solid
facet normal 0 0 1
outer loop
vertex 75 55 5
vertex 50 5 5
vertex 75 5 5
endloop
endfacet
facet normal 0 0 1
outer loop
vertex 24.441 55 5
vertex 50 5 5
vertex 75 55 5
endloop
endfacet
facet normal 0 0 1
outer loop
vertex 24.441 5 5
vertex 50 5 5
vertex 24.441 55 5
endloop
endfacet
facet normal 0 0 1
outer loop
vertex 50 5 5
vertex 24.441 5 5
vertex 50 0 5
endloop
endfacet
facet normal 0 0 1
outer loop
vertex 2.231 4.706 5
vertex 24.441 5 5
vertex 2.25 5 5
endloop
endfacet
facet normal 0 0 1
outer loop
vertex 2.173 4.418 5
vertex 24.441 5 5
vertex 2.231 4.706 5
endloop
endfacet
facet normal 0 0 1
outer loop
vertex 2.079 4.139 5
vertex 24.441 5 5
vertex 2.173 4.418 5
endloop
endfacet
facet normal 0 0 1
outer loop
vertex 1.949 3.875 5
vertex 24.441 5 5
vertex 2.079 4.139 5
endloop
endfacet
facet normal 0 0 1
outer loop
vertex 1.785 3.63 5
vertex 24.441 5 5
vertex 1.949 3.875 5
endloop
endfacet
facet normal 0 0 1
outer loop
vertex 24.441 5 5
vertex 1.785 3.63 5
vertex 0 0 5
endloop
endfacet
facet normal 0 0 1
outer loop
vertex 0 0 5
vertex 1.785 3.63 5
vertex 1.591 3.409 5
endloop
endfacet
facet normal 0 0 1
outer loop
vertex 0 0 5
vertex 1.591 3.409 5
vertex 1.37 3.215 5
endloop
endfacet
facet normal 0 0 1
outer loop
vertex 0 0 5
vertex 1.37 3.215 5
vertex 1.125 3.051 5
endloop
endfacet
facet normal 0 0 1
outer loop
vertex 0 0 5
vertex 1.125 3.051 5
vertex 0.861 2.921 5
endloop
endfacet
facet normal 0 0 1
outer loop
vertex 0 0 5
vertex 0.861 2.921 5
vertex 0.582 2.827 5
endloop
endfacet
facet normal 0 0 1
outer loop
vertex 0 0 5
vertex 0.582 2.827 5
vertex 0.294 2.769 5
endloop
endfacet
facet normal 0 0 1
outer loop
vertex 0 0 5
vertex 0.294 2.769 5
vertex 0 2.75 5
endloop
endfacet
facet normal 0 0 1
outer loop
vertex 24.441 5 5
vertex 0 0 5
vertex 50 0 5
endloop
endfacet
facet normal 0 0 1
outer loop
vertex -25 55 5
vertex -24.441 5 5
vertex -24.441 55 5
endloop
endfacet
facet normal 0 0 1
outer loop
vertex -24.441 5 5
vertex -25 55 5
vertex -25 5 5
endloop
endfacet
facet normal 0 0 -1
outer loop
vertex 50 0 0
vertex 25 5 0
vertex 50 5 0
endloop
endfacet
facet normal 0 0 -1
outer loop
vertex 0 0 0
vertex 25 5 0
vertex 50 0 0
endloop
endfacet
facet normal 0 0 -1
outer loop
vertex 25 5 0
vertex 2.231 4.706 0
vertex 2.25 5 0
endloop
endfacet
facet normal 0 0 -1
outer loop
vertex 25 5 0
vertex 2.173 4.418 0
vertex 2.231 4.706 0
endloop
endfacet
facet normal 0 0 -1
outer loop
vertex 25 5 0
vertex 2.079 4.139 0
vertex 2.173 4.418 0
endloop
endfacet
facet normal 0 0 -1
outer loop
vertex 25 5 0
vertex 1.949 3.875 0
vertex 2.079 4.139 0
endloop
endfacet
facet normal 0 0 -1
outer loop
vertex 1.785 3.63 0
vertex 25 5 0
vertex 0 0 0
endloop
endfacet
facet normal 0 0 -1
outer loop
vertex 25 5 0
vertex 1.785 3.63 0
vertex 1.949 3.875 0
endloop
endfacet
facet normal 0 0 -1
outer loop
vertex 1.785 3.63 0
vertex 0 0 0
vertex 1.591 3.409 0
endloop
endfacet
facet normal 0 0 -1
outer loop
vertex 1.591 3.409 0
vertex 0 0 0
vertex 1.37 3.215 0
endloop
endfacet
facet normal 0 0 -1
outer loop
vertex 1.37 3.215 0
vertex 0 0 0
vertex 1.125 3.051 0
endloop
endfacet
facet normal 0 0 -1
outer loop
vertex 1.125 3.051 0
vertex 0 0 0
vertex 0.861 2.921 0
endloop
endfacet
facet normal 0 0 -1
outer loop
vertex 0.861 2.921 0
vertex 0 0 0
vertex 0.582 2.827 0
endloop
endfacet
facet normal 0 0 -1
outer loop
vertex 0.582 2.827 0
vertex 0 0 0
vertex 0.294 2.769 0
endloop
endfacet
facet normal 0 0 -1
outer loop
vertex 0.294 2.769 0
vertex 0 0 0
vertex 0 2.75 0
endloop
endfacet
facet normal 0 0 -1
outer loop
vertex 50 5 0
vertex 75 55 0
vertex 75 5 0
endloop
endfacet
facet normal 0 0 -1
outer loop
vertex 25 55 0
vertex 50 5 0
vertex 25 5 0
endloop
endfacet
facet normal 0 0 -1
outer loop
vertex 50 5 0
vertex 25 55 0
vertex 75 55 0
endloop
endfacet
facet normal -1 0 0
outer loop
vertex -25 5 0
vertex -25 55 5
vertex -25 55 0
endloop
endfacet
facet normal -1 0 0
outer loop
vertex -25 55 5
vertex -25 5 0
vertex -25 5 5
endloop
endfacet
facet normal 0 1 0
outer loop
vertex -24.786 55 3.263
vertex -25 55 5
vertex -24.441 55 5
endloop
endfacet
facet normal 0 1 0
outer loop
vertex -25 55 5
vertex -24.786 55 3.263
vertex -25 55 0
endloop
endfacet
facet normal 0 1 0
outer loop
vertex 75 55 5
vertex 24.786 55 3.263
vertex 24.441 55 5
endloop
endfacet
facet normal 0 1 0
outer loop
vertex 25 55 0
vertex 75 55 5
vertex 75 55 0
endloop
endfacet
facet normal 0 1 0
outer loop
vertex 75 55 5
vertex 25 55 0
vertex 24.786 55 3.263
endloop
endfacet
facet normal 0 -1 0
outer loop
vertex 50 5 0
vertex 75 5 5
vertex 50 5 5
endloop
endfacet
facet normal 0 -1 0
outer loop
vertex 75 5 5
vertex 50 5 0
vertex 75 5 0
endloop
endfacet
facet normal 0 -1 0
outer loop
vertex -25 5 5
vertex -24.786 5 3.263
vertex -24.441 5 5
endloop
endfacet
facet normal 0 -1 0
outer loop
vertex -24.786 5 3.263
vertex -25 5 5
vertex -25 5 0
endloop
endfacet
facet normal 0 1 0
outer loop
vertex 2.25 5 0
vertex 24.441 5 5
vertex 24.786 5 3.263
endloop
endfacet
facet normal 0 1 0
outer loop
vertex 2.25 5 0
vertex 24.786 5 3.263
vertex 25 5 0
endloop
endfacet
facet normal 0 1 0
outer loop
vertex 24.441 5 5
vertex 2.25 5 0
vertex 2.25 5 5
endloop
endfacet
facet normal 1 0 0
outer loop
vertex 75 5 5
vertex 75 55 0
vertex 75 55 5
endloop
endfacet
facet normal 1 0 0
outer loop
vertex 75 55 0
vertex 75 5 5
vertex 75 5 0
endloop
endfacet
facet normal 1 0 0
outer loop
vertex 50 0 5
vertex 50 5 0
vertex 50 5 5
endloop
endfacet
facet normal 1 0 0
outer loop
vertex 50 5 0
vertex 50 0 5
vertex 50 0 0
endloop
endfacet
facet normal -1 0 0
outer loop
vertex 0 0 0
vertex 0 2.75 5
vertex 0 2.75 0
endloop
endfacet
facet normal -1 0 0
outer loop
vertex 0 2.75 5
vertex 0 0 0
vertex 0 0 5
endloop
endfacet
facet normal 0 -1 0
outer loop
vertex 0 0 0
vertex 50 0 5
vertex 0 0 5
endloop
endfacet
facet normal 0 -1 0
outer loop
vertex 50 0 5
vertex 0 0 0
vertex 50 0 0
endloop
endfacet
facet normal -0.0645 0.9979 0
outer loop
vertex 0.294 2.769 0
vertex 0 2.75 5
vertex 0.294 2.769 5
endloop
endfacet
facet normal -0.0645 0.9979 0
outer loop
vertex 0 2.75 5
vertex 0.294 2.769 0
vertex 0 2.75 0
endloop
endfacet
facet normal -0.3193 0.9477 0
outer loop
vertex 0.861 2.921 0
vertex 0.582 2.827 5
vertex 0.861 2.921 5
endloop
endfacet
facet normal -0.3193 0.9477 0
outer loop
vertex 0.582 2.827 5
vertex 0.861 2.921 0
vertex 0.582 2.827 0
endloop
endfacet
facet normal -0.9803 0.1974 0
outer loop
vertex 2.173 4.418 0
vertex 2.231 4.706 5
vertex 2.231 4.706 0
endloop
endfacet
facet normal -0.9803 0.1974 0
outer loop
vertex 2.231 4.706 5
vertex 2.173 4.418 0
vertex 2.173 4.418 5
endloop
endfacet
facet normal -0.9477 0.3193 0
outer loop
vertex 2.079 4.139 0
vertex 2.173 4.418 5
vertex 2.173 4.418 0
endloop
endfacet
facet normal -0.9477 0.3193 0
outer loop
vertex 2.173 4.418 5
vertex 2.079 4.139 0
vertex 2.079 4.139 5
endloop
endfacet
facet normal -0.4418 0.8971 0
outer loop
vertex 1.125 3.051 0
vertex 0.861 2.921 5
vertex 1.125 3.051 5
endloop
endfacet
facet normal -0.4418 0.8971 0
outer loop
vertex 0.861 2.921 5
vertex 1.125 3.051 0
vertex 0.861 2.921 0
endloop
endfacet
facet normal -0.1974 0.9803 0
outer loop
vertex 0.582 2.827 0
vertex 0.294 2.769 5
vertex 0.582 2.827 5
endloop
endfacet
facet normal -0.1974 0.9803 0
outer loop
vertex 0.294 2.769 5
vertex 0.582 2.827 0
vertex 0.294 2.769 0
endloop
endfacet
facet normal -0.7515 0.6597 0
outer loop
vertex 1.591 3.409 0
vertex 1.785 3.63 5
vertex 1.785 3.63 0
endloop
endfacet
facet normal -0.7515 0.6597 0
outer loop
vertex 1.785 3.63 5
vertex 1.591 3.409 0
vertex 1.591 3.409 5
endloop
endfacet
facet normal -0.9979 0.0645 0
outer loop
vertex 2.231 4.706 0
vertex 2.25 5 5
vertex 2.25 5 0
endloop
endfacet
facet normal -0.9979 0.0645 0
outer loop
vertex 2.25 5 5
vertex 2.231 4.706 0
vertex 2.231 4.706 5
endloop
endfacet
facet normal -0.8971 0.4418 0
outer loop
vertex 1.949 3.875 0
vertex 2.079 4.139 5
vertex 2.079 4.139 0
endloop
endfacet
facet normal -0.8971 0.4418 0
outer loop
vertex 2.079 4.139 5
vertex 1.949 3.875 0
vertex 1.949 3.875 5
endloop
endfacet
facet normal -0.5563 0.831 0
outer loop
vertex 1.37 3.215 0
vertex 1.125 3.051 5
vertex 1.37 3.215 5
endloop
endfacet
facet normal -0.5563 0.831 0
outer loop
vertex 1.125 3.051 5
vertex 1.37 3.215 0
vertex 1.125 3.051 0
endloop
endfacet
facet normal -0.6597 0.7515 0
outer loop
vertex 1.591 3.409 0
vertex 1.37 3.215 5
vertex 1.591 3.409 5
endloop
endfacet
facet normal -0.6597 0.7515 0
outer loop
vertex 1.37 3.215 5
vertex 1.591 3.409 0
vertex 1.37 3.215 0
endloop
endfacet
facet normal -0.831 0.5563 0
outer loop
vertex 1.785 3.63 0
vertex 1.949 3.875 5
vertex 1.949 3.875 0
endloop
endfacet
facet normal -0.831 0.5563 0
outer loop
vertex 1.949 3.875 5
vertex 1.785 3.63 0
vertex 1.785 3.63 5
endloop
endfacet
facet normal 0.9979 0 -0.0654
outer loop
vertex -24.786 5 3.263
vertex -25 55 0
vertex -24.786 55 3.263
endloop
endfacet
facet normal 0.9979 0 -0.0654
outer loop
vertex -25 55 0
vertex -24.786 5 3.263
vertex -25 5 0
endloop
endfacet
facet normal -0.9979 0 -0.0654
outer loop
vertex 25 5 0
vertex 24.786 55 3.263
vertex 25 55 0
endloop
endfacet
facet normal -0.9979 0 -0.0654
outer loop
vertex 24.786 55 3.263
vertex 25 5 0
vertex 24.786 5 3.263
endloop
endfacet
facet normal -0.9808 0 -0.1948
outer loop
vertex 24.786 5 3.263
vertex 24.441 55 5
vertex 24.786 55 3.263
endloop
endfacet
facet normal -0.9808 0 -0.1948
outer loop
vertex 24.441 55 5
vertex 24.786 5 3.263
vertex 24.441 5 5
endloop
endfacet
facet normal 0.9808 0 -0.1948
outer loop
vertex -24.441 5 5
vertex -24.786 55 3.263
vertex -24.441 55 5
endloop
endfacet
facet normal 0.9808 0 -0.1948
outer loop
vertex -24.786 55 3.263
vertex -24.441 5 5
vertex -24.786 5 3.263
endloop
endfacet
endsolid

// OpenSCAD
// L-shaped mounting bracket for a NEMA 17 stepper motor (syringe pump, bench top). NOVEL general part.
//

base_d  = 50;
base_t  = 5;
arm_l   = 50;
arm_t   = 5;
motor_h = 50;
screw  = 4.5;

$fn = 48;

gusset_t = 5;

difference() {
    union() {
        cube([base_d, base_t, base_t]);              // base plate (square, not rectangular - the user's X range -25..25 is 50 mm)
        cube([base_d, base_t, base_t]);
        translate([0, base_t, 0]) cube([base_d, arm_l, arm_t]);           // vertical motor plate
        for (x = [-base_d / 2, base_d / 2])
            translate([x, base_t, 0]) cube([base_d, arm_l, arm_t]);       // two gussets, right-angle corner at the plate junction
    }
    translate([0, base_t, -1]) cylinder(h = base_t + 2, d = screw);                 // 2 x M4 through-holes in the base
    translate([0, base_t, -1]) cylinder(h = base_t + 2, d = screw);
    translate([0, base_t, 0]) rotate([-90, 0, 0]) cylinder(h = arm_l + 2, d = motor_h);   // motor boss hole (along Y)
    for (z = [arm_t / 2, arm_t / 2 + 15.5])
        translate([0, base_t, z]) rotate([-90, 0, 0]) cylinder(h = arm_l + 2, d = screw);  // 4 x M3 screw holes in the arm
}
